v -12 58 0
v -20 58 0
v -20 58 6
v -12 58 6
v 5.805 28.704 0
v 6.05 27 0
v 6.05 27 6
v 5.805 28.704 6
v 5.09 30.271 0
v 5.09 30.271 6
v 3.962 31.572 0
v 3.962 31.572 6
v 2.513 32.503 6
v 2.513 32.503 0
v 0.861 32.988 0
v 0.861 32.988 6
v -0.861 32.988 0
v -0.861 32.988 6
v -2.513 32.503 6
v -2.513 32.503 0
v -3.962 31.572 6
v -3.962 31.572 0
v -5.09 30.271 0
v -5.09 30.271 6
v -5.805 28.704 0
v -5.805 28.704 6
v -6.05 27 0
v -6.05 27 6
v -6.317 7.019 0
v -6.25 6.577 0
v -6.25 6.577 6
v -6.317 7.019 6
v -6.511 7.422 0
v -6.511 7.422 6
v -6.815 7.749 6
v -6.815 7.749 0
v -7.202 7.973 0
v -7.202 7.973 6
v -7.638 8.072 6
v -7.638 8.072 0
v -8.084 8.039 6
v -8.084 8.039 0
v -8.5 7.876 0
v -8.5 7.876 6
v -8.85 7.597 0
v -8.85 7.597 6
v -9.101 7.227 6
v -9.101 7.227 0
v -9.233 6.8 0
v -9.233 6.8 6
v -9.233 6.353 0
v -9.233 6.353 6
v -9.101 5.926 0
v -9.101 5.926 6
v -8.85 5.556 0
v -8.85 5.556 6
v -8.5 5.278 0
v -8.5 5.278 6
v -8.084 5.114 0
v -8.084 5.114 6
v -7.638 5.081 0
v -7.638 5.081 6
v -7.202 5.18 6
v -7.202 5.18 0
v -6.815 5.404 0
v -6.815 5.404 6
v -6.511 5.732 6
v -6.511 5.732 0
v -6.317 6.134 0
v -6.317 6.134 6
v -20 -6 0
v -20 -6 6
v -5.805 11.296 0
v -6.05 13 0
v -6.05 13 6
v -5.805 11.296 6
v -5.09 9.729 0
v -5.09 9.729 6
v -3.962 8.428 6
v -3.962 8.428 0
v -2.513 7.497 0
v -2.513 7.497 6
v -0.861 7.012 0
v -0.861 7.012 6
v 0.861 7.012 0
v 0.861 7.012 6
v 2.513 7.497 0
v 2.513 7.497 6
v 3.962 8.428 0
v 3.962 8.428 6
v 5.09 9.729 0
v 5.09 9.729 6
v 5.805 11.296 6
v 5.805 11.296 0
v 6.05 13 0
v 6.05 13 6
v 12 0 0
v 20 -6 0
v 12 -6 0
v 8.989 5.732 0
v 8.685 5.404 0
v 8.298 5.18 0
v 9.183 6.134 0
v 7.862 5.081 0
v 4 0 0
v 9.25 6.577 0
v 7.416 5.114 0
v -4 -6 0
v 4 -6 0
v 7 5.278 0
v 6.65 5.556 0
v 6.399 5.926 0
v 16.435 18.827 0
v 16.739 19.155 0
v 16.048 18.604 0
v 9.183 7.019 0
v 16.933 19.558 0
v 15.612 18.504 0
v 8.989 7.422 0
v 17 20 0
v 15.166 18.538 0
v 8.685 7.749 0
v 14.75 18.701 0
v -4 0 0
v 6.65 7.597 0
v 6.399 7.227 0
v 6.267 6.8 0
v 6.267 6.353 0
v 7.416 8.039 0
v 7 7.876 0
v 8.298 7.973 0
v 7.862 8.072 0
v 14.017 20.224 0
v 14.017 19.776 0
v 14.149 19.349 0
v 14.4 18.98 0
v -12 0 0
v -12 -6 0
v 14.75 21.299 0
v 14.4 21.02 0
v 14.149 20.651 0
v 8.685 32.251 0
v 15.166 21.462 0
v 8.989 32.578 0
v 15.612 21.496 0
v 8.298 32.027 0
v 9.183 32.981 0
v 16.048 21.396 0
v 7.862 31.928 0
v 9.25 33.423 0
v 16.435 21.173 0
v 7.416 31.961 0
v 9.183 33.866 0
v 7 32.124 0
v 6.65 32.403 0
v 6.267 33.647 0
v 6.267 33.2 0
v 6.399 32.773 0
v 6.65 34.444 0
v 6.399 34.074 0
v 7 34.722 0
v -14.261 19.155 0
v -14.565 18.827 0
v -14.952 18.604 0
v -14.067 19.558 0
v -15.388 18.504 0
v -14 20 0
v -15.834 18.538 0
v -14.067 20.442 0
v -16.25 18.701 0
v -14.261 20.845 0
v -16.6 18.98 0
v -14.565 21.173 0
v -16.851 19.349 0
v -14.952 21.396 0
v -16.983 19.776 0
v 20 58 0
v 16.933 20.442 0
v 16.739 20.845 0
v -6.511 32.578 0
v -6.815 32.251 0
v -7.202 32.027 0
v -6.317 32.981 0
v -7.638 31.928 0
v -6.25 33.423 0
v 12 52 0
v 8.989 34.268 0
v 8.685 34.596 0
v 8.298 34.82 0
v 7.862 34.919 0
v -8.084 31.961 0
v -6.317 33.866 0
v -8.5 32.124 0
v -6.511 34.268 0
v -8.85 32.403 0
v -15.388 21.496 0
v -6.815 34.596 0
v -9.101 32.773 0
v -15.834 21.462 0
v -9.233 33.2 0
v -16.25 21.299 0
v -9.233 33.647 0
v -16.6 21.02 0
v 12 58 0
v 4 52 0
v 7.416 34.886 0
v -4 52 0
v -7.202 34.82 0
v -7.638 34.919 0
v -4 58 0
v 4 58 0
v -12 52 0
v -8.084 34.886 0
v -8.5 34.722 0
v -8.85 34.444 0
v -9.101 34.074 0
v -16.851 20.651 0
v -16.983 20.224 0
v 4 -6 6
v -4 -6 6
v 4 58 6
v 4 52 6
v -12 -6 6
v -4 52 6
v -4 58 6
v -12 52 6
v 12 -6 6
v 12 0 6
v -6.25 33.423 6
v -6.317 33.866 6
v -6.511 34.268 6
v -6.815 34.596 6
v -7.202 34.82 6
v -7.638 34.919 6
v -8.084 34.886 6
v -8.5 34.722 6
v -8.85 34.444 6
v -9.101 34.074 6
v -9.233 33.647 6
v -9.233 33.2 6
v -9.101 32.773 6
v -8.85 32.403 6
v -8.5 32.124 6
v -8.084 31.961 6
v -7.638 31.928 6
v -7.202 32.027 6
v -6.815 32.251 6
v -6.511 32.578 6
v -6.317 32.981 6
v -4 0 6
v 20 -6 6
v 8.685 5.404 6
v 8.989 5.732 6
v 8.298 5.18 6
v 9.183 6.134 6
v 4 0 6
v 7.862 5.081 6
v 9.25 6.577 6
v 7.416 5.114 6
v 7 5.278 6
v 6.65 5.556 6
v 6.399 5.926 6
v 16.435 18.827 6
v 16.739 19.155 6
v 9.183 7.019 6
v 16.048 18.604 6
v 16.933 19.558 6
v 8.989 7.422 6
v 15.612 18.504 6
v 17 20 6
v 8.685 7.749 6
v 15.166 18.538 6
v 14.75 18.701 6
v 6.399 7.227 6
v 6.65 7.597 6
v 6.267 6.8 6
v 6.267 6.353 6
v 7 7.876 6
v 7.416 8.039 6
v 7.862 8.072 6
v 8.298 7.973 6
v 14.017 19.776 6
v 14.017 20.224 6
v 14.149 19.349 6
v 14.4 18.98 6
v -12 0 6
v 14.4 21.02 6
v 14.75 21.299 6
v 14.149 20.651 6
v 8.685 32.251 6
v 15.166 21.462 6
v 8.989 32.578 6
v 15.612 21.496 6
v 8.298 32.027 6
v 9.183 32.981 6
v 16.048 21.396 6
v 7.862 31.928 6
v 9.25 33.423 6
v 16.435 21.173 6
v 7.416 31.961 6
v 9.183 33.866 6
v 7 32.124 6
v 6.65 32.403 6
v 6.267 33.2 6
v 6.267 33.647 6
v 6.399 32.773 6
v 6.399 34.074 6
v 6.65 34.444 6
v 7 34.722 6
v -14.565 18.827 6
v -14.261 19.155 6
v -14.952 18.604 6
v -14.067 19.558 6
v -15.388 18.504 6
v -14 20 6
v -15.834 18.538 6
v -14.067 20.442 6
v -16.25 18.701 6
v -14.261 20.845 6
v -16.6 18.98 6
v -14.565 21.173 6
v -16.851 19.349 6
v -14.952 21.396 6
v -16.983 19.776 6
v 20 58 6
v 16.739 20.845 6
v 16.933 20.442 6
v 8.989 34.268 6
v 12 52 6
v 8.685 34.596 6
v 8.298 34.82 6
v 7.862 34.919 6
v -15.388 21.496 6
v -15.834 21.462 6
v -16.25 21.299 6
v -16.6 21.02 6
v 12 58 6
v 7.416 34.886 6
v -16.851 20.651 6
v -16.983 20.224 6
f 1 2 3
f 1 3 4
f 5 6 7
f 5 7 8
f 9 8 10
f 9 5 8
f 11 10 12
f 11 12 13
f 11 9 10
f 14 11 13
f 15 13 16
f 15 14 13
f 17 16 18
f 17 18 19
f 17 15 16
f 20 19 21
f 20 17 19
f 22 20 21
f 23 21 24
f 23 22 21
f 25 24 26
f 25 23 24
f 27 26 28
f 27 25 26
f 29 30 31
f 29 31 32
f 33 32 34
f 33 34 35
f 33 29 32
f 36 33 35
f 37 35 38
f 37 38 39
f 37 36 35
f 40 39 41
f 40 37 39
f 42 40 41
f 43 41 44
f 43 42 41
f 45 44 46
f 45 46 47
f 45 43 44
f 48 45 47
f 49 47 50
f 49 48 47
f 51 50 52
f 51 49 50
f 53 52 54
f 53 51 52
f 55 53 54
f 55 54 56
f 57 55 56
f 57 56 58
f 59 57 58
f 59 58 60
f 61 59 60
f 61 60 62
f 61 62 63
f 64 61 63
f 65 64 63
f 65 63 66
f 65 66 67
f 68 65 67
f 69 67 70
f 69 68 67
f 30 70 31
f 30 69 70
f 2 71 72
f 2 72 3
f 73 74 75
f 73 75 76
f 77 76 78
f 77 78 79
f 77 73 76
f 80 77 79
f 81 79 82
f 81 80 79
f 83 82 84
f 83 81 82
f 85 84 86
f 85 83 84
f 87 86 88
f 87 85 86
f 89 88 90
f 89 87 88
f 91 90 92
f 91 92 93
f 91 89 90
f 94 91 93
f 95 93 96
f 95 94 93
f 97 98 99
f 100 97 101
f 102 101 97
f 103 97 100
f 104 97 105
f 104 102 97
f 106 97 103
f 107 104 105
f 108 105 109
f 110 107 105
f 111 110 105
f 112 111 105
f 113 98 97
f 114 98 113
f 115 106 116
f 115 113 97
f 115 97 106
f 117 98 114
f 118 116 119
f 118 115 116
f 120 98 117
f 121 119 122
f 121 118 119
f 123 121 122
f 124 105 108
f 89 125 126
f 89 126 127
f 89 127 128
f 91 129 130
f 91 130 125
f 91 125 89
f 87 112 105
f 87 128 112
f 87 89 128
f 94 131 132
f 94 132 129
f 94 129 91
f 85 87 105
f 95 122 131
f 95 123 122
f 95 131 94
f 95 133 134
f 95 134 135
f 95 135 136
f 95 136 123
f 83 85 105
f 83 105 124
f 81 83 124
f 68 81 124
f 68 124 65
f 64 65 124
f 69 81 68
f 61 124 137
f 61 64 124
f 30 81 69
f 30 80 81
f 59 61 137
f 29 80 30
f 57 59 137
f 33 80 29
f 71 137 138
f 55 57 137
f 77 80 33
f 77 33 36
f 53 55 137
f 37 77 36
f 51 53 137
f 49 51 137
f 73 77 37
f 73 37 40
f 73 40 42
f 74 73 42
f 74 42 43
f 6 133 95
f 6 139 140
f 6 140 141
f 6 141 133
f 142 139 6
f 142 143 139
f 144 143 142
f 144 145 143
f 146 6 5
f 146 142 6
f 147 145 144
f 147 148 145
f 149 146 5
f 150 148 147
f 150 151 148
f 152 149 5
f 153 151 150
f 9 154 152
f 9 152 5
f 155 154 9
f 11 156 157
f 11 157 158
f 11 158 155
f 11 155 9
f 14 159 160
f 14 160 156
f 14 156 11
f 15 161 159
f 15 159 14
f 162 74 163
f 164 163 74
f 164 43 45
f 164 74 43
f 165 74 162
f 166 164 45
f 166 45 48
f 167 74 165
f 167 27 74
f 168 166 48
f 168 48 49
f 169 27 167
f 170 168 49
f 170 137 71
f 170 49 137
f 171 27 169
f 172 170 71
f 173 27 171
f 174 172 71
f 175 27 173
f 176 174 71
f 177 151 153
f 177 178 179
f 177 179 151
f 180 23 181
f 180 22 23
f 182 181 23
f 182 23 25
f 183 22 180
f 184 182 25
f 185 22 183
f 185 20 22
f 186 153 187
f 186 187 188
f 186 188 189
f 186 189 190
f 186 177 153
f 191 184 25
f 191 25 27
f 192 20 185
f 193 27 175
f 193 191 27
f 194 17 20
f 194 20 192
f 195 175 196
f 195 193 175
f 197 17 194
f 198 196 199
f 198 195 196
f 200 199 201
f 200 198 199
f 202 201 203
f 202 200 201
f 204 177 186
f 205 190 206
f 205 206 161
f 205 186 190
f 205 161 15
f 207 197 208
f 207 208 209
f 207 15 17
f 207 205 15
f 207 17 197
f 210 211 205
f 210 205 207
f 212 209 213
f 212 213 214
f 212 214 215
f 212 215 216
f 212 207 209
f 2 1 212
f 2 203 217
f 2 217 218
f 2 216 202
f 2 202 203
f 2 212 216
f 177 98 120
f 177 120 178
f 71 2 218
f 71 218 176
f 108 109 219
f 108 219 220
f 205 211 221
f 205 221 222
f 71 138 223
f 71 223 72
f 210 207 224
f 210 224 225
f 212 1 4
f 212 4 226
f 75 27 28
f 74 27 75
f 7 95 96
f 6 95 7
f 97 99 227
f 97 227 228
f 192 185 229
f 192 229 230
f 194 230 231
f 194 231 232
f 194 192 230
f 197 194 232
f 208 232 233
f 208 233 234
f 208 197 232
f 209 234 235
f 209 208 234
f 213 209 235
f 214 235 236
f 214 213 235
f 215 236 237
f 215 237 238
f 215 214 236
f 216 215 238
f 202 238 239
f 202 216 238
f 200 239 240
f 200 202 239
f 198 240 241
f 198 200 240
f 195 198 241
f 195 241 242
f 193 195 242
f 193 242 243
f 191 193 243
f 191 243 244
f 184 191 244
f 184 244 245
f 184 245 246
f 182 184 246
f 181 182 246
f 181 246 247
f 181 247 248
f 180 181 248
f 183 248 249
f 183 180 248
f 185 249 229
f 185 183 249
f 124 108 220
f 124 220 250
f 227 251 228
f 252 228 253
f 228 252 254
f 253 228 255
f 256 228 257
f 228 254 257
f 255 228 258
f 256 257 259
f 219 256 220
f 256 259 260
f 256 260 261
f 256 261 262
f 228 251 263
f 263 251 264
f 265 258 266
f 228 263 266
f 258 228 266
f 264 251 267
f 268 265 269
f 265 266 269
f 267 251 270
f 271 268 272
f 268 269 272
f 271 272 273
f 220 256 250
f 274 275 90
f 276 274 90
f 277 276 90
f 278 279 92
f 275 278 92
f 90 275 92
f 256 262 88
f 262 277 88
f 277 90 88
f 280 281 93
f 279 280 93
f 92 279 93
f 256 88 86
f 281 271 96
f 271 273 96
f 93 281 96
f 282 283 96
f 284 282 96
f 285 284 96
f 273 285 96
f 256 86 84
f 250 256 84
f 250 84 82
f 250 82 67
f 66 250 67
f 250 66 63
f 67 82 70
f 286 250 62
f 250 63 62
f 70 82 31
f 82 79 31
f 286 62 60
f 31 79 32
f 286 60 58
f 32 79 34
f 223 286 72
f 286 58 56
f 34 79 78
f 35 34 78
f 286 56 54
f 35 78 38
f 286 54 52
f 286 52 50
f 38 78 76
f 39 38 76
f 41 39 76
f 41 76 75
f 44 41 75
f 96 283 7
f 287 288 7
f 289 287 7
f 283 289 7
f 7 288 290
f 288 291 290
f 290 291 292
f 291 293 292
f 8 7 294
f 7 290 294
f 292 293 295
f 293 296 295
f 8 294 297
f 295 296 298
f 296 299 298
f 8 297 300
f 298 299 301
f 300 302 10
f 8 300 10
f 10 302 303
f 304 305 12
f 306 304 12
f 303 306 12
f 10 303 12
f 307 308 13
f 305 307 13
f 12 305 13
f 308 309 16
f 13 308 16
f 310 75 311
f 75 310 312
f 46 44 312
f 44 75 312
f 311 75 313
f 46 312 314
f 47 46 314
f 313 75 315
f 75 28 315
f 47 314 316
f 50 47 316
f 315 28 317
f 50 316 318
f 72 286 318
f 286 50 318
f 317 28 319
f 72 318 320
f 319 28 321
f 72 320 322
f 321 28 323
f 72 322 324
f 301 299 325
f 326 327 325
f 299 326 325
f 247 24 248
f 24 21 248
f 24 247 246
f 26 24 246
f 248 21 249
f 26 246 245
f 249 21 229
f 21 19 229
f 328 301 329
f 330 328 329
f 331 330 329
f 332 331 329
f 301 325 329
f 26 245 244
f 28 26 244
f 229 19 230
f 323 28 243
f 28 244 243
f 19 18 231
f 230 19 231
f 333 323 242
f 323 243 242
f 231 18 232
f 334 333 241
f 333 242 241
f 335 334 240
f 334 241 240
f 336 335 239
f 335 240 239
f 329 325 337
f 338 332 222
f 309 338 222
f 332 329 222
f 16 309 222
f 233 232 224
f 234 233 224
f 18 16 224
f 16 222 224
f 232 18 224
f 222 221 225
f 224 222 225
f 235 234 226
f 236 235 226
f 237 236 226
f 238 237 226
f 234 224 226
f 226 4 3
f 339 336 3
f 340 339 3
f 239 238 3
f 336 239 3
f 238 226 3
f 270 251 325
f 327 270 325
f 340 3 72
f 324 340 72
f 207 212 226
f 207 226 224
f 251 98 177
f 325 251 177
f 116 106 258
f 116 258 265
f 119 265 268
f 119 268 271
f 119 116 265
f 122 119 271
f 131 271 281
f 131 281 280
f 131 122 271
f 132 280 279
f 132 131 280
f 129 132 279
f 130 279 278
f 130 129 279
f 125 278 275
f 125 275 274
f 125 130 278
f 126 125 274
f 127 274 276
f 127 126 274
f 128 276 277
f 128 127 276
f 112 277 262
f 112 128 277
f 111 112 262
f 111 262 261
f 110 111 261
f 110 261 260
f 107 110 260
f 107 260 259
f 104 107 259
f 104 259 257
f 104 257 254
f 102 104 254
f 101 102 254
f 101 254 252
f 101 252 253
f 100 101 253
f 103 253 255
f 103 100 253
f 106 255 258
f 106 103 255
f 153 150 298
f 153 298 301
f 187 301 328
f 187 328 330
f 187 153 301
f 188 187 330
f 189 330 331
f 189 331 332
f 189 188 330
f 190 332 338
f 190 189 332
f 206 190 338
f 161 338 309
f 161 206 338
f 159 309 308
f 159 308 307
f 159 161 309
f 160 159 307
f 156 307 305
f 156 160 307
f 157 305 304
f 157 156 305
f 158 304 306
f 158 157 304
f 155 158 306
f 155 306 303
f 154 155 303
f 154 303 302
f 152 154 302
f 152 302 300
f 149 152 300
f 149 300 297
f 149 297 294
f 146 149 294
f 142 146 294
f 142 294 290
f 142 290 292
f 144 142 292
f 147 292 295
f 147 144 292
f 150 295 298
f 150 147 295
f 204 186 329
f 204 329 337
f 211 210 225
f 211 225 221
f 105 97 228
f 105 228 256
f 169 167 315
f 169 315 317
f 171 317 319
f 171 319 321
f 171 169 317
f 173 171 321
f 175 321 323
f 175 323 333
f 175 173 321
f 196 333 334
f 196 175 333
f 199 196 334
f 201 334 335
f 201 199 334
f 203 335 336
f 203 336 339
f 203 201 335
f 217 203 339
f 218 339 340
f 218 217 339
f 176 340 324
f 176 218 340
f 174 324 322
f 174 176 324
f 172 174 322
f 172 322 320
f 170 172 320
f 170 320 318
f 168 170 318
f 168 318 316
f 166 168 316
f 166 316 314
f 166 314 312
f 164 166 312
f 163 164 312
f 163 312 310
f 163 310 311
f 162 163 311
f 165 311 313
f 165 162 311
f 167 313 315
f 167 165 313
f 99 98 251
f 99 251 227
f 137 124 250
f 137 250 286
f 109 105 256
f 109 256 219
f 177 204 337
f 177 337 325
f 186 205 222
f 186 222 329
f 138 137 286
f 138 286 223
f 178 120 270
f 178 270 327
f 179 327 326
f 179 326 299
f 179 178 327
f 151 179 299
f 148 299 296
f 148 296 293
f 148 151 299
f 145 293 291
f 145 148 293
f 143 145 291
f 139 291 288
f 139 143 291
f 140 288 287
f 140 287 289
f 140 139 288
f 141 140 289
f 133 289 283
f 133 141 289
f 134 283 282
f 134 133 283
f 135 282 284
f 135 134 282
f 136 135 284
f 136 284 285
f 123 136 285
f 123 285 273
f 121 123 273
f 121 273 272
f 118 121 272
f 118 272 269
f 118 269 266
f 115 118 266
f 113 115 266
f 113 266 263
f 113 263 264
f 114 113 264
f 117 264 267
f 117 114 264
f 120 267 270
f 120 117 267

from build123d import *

# Parameters (mm, degrees)
ESQUISSE1_R        = 1.5
BOSS_EXTRU_1_DEPTH = 6


with BuildPart() as part:
    # Esquisse1 → Boss.-Extru.1 (new body)
    with BuildSketch(Plane.XY):
        Polygon((-20, 58), (-12, 58), (-12, 52), (-4, 52), (-4, 58), (4, 58), (4, 52), (12, 52), (12, 58), (20, 58), (20, -1), (20, -6), (12, -6), (12, 0), (4, 0), (4, -6), (-4, -6), (-4, 0), (-12, 0), (-12, -6), (-20, -6), align=None)
        with Locations((-15.5, 20)):
            Circle(ESQUISSE1_R, mode=Mode.SUBTRACT)
        with Locations((-7.75, 33.423393759)):
            Circle(ESQUISSE1_R, mode=Mode.SUBTRACT)
        with Locations((7.75, 33.423393759)):
            Circle(ESQUISSE1_R, mode=Mode.SUBTRACT)
        with Locations((15.5, 20)):
            Circle(ESQUISSE1_R, mode=Mode.SUBTRACT)
        with Locations((7.75, 6.576606241)):
            Circle(ESQUISSE1_R, mode=Mode.SUBTRACT)
        with Locations((-7.75, 6.576606241)):
            Circle(ESQUISSE1_R, mode=Mode.SUBTRACT)
        with BuildLine():
            Line((-6.05, 27), (-6.05, 13))
            ThreePointArc((-6.05, 13), (0, 6.95), (6.05, 13))
            Line((6.05, 13), (6.05, 27))
            ThreePointArc((6.05, 27), (0, 33.05), (-6.05, 27))
        make_face(mode=Mode.SUBTRACT)
    extrude(amount=BOSS_EXTRU_1_DEPTH)


solid = part.part
